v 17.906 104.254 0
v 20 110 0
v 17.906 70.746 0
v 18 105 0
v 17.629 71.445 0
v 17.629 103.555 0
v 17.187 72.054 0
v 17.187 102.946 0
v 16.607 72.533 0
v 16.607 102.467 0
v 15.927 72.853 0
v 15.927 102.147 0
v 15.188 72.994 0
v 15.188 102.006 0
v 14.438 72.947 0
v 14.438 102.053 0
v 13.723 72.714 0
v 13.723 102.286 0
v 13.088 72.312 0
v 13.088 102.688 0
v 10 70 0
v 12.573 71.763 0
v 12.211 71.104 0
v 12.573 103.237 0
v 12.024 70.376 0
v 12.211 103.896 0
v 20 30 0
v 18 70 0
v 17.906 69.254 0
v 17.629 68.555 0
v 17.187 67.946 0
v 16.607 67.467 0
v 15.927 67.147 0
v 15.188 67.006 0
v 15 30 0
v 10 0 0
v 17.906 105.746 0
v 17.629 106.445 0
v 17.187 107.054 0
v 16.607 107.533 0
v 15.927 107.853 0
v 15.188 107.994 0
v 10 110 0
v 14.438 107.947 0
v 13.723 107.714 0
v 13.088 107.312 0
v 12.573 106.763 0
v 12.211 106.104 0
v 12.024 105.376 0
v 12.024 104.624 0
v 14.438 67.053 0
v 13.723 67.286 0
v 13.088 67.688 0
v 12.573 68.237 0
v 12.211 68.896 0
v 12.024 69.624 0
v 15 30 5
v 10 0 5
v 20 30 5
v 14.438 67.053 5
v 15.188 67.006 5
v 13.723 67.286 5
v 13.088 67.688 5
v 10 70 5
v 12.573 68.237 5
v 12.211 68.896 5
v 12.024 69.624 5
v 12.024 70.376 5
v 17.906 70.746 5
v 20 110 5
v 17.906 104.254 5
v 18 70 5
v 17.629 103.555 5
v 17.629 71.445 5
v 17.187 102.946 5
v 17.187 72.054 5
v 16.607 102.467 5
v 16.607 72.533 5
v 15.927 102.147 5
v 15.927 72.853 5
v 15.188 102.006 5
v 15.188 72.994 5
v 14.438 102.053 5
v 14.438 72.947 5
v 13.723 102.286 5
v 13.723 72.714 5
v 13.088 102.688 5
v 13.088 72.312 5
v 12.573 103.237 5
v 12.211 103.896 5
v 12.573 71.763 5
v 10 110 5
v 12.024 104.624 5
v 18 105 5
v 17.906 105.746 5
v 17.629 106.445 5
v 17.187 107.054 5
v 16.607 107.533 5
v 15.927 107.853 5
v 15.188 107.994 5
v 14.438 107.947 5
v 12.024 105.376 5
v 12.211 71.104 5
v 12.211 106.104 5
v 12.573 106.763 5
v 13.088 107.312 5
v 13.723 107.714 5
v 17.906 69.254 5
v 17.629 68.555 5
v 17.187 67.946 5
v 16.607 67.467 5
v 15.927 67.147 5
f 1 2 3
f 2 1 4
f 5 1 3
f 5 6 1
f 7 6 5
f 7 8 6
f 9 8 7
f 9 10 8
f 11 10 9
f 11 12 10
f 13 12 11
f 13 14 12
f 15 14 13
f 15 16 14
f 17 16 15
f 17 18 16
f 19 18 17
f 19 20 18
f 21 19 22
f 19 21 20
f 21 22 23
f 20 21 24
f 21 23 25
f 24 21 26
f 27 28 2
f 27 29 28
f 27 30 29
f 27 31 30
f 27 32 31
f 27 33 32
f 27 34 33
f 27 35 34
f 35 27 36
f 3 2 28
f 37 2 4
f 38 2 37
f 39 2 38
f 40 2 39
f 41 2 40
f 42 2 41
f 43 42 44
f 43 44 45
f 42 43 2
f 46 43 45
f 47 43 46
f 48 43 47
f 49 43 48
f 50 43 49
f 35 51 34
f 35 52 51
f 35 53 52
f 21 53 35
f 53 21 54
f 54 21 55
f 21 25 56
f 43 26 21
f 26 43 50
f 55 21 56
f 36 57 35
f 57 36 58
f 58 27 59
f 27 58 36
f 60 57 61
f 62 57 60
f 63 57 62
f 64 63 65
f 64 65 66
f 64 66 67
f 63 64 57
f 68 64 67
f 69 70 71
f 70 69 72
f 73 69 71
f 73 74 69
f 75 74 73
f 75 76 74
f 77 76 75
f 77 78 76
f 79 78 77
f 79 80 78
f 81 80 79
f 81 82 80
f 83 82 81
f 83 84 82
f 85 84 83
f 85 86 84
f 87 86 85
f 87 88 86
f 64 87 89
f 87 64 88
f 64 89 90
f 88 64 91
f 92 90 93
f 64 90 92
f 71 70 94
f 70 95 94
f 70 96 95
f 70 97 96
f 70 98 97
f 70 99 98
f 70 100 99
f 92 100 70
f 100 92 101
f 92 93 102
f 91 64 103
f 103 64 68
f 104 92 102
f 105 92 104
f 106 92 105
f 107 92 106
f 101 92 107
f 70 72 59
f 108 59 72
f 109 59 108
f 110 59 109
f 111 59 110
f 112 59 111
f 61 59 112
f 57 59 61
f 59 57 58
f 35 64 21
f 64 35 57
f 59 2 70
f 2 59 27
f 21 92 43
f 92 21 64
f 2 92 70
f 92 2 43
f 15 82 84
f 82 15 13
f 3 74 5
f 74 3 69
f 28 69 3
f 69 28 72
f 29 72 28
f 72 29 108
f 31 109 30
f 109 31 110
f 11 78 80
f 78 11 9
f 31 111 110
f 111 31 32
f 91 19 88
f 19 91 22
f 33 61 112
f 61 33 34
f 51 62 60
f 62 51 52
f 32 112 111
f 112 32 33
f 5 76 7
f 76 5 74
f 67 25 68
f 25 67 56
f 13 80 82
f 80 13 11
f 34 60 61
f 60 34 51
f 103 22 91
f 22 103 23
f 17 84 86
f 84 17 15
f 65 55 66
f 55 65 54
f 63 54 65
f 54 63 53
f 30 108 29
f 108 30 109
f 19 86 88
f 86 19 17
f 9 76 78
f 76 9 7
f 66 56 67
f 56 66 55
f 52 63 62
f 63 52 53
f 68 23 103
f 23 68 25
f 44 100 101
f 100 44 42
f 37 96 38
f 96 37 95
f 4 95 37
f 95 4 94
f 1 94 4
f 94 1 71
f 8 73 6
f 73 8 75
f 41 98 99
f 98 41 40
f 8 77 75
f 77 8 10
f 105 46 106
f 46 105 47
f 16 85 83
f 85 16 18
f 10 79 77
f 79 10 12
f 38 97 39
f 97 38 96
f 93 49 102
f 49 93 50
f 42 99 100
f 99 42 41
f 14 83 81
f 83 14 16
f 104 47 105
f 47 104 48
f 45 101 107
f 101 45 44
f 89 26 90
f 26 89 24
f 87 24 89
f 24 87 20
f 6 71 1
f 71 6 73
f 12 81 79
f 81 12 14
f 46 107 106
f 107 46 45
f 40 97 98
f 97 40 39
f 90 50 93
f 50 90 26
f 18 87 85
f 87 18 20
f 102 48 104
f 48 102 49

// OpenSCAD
quality=25;

difference()
{
union()
{
    //leg tip
    linear_extrude(height=5) polygon(points=[[10,0],[20,30],[15,30]]);

    //leg body
    linear_extrude(height=5) polygon(points=[[20,30],[20,70],[10,70],[15,30]]);

    //leg top
    translate([10,70,0]) cube([10,40,5]);
}

union()
{
    gap_radius=3;
    translate([15,70,-2.5]) cylinder(r=gap_radius,h=10,$fn=quality);
    translate([15,105,-2.5]) cylinder(r=gap_radius,h=10,$fn=quality);
}
}
